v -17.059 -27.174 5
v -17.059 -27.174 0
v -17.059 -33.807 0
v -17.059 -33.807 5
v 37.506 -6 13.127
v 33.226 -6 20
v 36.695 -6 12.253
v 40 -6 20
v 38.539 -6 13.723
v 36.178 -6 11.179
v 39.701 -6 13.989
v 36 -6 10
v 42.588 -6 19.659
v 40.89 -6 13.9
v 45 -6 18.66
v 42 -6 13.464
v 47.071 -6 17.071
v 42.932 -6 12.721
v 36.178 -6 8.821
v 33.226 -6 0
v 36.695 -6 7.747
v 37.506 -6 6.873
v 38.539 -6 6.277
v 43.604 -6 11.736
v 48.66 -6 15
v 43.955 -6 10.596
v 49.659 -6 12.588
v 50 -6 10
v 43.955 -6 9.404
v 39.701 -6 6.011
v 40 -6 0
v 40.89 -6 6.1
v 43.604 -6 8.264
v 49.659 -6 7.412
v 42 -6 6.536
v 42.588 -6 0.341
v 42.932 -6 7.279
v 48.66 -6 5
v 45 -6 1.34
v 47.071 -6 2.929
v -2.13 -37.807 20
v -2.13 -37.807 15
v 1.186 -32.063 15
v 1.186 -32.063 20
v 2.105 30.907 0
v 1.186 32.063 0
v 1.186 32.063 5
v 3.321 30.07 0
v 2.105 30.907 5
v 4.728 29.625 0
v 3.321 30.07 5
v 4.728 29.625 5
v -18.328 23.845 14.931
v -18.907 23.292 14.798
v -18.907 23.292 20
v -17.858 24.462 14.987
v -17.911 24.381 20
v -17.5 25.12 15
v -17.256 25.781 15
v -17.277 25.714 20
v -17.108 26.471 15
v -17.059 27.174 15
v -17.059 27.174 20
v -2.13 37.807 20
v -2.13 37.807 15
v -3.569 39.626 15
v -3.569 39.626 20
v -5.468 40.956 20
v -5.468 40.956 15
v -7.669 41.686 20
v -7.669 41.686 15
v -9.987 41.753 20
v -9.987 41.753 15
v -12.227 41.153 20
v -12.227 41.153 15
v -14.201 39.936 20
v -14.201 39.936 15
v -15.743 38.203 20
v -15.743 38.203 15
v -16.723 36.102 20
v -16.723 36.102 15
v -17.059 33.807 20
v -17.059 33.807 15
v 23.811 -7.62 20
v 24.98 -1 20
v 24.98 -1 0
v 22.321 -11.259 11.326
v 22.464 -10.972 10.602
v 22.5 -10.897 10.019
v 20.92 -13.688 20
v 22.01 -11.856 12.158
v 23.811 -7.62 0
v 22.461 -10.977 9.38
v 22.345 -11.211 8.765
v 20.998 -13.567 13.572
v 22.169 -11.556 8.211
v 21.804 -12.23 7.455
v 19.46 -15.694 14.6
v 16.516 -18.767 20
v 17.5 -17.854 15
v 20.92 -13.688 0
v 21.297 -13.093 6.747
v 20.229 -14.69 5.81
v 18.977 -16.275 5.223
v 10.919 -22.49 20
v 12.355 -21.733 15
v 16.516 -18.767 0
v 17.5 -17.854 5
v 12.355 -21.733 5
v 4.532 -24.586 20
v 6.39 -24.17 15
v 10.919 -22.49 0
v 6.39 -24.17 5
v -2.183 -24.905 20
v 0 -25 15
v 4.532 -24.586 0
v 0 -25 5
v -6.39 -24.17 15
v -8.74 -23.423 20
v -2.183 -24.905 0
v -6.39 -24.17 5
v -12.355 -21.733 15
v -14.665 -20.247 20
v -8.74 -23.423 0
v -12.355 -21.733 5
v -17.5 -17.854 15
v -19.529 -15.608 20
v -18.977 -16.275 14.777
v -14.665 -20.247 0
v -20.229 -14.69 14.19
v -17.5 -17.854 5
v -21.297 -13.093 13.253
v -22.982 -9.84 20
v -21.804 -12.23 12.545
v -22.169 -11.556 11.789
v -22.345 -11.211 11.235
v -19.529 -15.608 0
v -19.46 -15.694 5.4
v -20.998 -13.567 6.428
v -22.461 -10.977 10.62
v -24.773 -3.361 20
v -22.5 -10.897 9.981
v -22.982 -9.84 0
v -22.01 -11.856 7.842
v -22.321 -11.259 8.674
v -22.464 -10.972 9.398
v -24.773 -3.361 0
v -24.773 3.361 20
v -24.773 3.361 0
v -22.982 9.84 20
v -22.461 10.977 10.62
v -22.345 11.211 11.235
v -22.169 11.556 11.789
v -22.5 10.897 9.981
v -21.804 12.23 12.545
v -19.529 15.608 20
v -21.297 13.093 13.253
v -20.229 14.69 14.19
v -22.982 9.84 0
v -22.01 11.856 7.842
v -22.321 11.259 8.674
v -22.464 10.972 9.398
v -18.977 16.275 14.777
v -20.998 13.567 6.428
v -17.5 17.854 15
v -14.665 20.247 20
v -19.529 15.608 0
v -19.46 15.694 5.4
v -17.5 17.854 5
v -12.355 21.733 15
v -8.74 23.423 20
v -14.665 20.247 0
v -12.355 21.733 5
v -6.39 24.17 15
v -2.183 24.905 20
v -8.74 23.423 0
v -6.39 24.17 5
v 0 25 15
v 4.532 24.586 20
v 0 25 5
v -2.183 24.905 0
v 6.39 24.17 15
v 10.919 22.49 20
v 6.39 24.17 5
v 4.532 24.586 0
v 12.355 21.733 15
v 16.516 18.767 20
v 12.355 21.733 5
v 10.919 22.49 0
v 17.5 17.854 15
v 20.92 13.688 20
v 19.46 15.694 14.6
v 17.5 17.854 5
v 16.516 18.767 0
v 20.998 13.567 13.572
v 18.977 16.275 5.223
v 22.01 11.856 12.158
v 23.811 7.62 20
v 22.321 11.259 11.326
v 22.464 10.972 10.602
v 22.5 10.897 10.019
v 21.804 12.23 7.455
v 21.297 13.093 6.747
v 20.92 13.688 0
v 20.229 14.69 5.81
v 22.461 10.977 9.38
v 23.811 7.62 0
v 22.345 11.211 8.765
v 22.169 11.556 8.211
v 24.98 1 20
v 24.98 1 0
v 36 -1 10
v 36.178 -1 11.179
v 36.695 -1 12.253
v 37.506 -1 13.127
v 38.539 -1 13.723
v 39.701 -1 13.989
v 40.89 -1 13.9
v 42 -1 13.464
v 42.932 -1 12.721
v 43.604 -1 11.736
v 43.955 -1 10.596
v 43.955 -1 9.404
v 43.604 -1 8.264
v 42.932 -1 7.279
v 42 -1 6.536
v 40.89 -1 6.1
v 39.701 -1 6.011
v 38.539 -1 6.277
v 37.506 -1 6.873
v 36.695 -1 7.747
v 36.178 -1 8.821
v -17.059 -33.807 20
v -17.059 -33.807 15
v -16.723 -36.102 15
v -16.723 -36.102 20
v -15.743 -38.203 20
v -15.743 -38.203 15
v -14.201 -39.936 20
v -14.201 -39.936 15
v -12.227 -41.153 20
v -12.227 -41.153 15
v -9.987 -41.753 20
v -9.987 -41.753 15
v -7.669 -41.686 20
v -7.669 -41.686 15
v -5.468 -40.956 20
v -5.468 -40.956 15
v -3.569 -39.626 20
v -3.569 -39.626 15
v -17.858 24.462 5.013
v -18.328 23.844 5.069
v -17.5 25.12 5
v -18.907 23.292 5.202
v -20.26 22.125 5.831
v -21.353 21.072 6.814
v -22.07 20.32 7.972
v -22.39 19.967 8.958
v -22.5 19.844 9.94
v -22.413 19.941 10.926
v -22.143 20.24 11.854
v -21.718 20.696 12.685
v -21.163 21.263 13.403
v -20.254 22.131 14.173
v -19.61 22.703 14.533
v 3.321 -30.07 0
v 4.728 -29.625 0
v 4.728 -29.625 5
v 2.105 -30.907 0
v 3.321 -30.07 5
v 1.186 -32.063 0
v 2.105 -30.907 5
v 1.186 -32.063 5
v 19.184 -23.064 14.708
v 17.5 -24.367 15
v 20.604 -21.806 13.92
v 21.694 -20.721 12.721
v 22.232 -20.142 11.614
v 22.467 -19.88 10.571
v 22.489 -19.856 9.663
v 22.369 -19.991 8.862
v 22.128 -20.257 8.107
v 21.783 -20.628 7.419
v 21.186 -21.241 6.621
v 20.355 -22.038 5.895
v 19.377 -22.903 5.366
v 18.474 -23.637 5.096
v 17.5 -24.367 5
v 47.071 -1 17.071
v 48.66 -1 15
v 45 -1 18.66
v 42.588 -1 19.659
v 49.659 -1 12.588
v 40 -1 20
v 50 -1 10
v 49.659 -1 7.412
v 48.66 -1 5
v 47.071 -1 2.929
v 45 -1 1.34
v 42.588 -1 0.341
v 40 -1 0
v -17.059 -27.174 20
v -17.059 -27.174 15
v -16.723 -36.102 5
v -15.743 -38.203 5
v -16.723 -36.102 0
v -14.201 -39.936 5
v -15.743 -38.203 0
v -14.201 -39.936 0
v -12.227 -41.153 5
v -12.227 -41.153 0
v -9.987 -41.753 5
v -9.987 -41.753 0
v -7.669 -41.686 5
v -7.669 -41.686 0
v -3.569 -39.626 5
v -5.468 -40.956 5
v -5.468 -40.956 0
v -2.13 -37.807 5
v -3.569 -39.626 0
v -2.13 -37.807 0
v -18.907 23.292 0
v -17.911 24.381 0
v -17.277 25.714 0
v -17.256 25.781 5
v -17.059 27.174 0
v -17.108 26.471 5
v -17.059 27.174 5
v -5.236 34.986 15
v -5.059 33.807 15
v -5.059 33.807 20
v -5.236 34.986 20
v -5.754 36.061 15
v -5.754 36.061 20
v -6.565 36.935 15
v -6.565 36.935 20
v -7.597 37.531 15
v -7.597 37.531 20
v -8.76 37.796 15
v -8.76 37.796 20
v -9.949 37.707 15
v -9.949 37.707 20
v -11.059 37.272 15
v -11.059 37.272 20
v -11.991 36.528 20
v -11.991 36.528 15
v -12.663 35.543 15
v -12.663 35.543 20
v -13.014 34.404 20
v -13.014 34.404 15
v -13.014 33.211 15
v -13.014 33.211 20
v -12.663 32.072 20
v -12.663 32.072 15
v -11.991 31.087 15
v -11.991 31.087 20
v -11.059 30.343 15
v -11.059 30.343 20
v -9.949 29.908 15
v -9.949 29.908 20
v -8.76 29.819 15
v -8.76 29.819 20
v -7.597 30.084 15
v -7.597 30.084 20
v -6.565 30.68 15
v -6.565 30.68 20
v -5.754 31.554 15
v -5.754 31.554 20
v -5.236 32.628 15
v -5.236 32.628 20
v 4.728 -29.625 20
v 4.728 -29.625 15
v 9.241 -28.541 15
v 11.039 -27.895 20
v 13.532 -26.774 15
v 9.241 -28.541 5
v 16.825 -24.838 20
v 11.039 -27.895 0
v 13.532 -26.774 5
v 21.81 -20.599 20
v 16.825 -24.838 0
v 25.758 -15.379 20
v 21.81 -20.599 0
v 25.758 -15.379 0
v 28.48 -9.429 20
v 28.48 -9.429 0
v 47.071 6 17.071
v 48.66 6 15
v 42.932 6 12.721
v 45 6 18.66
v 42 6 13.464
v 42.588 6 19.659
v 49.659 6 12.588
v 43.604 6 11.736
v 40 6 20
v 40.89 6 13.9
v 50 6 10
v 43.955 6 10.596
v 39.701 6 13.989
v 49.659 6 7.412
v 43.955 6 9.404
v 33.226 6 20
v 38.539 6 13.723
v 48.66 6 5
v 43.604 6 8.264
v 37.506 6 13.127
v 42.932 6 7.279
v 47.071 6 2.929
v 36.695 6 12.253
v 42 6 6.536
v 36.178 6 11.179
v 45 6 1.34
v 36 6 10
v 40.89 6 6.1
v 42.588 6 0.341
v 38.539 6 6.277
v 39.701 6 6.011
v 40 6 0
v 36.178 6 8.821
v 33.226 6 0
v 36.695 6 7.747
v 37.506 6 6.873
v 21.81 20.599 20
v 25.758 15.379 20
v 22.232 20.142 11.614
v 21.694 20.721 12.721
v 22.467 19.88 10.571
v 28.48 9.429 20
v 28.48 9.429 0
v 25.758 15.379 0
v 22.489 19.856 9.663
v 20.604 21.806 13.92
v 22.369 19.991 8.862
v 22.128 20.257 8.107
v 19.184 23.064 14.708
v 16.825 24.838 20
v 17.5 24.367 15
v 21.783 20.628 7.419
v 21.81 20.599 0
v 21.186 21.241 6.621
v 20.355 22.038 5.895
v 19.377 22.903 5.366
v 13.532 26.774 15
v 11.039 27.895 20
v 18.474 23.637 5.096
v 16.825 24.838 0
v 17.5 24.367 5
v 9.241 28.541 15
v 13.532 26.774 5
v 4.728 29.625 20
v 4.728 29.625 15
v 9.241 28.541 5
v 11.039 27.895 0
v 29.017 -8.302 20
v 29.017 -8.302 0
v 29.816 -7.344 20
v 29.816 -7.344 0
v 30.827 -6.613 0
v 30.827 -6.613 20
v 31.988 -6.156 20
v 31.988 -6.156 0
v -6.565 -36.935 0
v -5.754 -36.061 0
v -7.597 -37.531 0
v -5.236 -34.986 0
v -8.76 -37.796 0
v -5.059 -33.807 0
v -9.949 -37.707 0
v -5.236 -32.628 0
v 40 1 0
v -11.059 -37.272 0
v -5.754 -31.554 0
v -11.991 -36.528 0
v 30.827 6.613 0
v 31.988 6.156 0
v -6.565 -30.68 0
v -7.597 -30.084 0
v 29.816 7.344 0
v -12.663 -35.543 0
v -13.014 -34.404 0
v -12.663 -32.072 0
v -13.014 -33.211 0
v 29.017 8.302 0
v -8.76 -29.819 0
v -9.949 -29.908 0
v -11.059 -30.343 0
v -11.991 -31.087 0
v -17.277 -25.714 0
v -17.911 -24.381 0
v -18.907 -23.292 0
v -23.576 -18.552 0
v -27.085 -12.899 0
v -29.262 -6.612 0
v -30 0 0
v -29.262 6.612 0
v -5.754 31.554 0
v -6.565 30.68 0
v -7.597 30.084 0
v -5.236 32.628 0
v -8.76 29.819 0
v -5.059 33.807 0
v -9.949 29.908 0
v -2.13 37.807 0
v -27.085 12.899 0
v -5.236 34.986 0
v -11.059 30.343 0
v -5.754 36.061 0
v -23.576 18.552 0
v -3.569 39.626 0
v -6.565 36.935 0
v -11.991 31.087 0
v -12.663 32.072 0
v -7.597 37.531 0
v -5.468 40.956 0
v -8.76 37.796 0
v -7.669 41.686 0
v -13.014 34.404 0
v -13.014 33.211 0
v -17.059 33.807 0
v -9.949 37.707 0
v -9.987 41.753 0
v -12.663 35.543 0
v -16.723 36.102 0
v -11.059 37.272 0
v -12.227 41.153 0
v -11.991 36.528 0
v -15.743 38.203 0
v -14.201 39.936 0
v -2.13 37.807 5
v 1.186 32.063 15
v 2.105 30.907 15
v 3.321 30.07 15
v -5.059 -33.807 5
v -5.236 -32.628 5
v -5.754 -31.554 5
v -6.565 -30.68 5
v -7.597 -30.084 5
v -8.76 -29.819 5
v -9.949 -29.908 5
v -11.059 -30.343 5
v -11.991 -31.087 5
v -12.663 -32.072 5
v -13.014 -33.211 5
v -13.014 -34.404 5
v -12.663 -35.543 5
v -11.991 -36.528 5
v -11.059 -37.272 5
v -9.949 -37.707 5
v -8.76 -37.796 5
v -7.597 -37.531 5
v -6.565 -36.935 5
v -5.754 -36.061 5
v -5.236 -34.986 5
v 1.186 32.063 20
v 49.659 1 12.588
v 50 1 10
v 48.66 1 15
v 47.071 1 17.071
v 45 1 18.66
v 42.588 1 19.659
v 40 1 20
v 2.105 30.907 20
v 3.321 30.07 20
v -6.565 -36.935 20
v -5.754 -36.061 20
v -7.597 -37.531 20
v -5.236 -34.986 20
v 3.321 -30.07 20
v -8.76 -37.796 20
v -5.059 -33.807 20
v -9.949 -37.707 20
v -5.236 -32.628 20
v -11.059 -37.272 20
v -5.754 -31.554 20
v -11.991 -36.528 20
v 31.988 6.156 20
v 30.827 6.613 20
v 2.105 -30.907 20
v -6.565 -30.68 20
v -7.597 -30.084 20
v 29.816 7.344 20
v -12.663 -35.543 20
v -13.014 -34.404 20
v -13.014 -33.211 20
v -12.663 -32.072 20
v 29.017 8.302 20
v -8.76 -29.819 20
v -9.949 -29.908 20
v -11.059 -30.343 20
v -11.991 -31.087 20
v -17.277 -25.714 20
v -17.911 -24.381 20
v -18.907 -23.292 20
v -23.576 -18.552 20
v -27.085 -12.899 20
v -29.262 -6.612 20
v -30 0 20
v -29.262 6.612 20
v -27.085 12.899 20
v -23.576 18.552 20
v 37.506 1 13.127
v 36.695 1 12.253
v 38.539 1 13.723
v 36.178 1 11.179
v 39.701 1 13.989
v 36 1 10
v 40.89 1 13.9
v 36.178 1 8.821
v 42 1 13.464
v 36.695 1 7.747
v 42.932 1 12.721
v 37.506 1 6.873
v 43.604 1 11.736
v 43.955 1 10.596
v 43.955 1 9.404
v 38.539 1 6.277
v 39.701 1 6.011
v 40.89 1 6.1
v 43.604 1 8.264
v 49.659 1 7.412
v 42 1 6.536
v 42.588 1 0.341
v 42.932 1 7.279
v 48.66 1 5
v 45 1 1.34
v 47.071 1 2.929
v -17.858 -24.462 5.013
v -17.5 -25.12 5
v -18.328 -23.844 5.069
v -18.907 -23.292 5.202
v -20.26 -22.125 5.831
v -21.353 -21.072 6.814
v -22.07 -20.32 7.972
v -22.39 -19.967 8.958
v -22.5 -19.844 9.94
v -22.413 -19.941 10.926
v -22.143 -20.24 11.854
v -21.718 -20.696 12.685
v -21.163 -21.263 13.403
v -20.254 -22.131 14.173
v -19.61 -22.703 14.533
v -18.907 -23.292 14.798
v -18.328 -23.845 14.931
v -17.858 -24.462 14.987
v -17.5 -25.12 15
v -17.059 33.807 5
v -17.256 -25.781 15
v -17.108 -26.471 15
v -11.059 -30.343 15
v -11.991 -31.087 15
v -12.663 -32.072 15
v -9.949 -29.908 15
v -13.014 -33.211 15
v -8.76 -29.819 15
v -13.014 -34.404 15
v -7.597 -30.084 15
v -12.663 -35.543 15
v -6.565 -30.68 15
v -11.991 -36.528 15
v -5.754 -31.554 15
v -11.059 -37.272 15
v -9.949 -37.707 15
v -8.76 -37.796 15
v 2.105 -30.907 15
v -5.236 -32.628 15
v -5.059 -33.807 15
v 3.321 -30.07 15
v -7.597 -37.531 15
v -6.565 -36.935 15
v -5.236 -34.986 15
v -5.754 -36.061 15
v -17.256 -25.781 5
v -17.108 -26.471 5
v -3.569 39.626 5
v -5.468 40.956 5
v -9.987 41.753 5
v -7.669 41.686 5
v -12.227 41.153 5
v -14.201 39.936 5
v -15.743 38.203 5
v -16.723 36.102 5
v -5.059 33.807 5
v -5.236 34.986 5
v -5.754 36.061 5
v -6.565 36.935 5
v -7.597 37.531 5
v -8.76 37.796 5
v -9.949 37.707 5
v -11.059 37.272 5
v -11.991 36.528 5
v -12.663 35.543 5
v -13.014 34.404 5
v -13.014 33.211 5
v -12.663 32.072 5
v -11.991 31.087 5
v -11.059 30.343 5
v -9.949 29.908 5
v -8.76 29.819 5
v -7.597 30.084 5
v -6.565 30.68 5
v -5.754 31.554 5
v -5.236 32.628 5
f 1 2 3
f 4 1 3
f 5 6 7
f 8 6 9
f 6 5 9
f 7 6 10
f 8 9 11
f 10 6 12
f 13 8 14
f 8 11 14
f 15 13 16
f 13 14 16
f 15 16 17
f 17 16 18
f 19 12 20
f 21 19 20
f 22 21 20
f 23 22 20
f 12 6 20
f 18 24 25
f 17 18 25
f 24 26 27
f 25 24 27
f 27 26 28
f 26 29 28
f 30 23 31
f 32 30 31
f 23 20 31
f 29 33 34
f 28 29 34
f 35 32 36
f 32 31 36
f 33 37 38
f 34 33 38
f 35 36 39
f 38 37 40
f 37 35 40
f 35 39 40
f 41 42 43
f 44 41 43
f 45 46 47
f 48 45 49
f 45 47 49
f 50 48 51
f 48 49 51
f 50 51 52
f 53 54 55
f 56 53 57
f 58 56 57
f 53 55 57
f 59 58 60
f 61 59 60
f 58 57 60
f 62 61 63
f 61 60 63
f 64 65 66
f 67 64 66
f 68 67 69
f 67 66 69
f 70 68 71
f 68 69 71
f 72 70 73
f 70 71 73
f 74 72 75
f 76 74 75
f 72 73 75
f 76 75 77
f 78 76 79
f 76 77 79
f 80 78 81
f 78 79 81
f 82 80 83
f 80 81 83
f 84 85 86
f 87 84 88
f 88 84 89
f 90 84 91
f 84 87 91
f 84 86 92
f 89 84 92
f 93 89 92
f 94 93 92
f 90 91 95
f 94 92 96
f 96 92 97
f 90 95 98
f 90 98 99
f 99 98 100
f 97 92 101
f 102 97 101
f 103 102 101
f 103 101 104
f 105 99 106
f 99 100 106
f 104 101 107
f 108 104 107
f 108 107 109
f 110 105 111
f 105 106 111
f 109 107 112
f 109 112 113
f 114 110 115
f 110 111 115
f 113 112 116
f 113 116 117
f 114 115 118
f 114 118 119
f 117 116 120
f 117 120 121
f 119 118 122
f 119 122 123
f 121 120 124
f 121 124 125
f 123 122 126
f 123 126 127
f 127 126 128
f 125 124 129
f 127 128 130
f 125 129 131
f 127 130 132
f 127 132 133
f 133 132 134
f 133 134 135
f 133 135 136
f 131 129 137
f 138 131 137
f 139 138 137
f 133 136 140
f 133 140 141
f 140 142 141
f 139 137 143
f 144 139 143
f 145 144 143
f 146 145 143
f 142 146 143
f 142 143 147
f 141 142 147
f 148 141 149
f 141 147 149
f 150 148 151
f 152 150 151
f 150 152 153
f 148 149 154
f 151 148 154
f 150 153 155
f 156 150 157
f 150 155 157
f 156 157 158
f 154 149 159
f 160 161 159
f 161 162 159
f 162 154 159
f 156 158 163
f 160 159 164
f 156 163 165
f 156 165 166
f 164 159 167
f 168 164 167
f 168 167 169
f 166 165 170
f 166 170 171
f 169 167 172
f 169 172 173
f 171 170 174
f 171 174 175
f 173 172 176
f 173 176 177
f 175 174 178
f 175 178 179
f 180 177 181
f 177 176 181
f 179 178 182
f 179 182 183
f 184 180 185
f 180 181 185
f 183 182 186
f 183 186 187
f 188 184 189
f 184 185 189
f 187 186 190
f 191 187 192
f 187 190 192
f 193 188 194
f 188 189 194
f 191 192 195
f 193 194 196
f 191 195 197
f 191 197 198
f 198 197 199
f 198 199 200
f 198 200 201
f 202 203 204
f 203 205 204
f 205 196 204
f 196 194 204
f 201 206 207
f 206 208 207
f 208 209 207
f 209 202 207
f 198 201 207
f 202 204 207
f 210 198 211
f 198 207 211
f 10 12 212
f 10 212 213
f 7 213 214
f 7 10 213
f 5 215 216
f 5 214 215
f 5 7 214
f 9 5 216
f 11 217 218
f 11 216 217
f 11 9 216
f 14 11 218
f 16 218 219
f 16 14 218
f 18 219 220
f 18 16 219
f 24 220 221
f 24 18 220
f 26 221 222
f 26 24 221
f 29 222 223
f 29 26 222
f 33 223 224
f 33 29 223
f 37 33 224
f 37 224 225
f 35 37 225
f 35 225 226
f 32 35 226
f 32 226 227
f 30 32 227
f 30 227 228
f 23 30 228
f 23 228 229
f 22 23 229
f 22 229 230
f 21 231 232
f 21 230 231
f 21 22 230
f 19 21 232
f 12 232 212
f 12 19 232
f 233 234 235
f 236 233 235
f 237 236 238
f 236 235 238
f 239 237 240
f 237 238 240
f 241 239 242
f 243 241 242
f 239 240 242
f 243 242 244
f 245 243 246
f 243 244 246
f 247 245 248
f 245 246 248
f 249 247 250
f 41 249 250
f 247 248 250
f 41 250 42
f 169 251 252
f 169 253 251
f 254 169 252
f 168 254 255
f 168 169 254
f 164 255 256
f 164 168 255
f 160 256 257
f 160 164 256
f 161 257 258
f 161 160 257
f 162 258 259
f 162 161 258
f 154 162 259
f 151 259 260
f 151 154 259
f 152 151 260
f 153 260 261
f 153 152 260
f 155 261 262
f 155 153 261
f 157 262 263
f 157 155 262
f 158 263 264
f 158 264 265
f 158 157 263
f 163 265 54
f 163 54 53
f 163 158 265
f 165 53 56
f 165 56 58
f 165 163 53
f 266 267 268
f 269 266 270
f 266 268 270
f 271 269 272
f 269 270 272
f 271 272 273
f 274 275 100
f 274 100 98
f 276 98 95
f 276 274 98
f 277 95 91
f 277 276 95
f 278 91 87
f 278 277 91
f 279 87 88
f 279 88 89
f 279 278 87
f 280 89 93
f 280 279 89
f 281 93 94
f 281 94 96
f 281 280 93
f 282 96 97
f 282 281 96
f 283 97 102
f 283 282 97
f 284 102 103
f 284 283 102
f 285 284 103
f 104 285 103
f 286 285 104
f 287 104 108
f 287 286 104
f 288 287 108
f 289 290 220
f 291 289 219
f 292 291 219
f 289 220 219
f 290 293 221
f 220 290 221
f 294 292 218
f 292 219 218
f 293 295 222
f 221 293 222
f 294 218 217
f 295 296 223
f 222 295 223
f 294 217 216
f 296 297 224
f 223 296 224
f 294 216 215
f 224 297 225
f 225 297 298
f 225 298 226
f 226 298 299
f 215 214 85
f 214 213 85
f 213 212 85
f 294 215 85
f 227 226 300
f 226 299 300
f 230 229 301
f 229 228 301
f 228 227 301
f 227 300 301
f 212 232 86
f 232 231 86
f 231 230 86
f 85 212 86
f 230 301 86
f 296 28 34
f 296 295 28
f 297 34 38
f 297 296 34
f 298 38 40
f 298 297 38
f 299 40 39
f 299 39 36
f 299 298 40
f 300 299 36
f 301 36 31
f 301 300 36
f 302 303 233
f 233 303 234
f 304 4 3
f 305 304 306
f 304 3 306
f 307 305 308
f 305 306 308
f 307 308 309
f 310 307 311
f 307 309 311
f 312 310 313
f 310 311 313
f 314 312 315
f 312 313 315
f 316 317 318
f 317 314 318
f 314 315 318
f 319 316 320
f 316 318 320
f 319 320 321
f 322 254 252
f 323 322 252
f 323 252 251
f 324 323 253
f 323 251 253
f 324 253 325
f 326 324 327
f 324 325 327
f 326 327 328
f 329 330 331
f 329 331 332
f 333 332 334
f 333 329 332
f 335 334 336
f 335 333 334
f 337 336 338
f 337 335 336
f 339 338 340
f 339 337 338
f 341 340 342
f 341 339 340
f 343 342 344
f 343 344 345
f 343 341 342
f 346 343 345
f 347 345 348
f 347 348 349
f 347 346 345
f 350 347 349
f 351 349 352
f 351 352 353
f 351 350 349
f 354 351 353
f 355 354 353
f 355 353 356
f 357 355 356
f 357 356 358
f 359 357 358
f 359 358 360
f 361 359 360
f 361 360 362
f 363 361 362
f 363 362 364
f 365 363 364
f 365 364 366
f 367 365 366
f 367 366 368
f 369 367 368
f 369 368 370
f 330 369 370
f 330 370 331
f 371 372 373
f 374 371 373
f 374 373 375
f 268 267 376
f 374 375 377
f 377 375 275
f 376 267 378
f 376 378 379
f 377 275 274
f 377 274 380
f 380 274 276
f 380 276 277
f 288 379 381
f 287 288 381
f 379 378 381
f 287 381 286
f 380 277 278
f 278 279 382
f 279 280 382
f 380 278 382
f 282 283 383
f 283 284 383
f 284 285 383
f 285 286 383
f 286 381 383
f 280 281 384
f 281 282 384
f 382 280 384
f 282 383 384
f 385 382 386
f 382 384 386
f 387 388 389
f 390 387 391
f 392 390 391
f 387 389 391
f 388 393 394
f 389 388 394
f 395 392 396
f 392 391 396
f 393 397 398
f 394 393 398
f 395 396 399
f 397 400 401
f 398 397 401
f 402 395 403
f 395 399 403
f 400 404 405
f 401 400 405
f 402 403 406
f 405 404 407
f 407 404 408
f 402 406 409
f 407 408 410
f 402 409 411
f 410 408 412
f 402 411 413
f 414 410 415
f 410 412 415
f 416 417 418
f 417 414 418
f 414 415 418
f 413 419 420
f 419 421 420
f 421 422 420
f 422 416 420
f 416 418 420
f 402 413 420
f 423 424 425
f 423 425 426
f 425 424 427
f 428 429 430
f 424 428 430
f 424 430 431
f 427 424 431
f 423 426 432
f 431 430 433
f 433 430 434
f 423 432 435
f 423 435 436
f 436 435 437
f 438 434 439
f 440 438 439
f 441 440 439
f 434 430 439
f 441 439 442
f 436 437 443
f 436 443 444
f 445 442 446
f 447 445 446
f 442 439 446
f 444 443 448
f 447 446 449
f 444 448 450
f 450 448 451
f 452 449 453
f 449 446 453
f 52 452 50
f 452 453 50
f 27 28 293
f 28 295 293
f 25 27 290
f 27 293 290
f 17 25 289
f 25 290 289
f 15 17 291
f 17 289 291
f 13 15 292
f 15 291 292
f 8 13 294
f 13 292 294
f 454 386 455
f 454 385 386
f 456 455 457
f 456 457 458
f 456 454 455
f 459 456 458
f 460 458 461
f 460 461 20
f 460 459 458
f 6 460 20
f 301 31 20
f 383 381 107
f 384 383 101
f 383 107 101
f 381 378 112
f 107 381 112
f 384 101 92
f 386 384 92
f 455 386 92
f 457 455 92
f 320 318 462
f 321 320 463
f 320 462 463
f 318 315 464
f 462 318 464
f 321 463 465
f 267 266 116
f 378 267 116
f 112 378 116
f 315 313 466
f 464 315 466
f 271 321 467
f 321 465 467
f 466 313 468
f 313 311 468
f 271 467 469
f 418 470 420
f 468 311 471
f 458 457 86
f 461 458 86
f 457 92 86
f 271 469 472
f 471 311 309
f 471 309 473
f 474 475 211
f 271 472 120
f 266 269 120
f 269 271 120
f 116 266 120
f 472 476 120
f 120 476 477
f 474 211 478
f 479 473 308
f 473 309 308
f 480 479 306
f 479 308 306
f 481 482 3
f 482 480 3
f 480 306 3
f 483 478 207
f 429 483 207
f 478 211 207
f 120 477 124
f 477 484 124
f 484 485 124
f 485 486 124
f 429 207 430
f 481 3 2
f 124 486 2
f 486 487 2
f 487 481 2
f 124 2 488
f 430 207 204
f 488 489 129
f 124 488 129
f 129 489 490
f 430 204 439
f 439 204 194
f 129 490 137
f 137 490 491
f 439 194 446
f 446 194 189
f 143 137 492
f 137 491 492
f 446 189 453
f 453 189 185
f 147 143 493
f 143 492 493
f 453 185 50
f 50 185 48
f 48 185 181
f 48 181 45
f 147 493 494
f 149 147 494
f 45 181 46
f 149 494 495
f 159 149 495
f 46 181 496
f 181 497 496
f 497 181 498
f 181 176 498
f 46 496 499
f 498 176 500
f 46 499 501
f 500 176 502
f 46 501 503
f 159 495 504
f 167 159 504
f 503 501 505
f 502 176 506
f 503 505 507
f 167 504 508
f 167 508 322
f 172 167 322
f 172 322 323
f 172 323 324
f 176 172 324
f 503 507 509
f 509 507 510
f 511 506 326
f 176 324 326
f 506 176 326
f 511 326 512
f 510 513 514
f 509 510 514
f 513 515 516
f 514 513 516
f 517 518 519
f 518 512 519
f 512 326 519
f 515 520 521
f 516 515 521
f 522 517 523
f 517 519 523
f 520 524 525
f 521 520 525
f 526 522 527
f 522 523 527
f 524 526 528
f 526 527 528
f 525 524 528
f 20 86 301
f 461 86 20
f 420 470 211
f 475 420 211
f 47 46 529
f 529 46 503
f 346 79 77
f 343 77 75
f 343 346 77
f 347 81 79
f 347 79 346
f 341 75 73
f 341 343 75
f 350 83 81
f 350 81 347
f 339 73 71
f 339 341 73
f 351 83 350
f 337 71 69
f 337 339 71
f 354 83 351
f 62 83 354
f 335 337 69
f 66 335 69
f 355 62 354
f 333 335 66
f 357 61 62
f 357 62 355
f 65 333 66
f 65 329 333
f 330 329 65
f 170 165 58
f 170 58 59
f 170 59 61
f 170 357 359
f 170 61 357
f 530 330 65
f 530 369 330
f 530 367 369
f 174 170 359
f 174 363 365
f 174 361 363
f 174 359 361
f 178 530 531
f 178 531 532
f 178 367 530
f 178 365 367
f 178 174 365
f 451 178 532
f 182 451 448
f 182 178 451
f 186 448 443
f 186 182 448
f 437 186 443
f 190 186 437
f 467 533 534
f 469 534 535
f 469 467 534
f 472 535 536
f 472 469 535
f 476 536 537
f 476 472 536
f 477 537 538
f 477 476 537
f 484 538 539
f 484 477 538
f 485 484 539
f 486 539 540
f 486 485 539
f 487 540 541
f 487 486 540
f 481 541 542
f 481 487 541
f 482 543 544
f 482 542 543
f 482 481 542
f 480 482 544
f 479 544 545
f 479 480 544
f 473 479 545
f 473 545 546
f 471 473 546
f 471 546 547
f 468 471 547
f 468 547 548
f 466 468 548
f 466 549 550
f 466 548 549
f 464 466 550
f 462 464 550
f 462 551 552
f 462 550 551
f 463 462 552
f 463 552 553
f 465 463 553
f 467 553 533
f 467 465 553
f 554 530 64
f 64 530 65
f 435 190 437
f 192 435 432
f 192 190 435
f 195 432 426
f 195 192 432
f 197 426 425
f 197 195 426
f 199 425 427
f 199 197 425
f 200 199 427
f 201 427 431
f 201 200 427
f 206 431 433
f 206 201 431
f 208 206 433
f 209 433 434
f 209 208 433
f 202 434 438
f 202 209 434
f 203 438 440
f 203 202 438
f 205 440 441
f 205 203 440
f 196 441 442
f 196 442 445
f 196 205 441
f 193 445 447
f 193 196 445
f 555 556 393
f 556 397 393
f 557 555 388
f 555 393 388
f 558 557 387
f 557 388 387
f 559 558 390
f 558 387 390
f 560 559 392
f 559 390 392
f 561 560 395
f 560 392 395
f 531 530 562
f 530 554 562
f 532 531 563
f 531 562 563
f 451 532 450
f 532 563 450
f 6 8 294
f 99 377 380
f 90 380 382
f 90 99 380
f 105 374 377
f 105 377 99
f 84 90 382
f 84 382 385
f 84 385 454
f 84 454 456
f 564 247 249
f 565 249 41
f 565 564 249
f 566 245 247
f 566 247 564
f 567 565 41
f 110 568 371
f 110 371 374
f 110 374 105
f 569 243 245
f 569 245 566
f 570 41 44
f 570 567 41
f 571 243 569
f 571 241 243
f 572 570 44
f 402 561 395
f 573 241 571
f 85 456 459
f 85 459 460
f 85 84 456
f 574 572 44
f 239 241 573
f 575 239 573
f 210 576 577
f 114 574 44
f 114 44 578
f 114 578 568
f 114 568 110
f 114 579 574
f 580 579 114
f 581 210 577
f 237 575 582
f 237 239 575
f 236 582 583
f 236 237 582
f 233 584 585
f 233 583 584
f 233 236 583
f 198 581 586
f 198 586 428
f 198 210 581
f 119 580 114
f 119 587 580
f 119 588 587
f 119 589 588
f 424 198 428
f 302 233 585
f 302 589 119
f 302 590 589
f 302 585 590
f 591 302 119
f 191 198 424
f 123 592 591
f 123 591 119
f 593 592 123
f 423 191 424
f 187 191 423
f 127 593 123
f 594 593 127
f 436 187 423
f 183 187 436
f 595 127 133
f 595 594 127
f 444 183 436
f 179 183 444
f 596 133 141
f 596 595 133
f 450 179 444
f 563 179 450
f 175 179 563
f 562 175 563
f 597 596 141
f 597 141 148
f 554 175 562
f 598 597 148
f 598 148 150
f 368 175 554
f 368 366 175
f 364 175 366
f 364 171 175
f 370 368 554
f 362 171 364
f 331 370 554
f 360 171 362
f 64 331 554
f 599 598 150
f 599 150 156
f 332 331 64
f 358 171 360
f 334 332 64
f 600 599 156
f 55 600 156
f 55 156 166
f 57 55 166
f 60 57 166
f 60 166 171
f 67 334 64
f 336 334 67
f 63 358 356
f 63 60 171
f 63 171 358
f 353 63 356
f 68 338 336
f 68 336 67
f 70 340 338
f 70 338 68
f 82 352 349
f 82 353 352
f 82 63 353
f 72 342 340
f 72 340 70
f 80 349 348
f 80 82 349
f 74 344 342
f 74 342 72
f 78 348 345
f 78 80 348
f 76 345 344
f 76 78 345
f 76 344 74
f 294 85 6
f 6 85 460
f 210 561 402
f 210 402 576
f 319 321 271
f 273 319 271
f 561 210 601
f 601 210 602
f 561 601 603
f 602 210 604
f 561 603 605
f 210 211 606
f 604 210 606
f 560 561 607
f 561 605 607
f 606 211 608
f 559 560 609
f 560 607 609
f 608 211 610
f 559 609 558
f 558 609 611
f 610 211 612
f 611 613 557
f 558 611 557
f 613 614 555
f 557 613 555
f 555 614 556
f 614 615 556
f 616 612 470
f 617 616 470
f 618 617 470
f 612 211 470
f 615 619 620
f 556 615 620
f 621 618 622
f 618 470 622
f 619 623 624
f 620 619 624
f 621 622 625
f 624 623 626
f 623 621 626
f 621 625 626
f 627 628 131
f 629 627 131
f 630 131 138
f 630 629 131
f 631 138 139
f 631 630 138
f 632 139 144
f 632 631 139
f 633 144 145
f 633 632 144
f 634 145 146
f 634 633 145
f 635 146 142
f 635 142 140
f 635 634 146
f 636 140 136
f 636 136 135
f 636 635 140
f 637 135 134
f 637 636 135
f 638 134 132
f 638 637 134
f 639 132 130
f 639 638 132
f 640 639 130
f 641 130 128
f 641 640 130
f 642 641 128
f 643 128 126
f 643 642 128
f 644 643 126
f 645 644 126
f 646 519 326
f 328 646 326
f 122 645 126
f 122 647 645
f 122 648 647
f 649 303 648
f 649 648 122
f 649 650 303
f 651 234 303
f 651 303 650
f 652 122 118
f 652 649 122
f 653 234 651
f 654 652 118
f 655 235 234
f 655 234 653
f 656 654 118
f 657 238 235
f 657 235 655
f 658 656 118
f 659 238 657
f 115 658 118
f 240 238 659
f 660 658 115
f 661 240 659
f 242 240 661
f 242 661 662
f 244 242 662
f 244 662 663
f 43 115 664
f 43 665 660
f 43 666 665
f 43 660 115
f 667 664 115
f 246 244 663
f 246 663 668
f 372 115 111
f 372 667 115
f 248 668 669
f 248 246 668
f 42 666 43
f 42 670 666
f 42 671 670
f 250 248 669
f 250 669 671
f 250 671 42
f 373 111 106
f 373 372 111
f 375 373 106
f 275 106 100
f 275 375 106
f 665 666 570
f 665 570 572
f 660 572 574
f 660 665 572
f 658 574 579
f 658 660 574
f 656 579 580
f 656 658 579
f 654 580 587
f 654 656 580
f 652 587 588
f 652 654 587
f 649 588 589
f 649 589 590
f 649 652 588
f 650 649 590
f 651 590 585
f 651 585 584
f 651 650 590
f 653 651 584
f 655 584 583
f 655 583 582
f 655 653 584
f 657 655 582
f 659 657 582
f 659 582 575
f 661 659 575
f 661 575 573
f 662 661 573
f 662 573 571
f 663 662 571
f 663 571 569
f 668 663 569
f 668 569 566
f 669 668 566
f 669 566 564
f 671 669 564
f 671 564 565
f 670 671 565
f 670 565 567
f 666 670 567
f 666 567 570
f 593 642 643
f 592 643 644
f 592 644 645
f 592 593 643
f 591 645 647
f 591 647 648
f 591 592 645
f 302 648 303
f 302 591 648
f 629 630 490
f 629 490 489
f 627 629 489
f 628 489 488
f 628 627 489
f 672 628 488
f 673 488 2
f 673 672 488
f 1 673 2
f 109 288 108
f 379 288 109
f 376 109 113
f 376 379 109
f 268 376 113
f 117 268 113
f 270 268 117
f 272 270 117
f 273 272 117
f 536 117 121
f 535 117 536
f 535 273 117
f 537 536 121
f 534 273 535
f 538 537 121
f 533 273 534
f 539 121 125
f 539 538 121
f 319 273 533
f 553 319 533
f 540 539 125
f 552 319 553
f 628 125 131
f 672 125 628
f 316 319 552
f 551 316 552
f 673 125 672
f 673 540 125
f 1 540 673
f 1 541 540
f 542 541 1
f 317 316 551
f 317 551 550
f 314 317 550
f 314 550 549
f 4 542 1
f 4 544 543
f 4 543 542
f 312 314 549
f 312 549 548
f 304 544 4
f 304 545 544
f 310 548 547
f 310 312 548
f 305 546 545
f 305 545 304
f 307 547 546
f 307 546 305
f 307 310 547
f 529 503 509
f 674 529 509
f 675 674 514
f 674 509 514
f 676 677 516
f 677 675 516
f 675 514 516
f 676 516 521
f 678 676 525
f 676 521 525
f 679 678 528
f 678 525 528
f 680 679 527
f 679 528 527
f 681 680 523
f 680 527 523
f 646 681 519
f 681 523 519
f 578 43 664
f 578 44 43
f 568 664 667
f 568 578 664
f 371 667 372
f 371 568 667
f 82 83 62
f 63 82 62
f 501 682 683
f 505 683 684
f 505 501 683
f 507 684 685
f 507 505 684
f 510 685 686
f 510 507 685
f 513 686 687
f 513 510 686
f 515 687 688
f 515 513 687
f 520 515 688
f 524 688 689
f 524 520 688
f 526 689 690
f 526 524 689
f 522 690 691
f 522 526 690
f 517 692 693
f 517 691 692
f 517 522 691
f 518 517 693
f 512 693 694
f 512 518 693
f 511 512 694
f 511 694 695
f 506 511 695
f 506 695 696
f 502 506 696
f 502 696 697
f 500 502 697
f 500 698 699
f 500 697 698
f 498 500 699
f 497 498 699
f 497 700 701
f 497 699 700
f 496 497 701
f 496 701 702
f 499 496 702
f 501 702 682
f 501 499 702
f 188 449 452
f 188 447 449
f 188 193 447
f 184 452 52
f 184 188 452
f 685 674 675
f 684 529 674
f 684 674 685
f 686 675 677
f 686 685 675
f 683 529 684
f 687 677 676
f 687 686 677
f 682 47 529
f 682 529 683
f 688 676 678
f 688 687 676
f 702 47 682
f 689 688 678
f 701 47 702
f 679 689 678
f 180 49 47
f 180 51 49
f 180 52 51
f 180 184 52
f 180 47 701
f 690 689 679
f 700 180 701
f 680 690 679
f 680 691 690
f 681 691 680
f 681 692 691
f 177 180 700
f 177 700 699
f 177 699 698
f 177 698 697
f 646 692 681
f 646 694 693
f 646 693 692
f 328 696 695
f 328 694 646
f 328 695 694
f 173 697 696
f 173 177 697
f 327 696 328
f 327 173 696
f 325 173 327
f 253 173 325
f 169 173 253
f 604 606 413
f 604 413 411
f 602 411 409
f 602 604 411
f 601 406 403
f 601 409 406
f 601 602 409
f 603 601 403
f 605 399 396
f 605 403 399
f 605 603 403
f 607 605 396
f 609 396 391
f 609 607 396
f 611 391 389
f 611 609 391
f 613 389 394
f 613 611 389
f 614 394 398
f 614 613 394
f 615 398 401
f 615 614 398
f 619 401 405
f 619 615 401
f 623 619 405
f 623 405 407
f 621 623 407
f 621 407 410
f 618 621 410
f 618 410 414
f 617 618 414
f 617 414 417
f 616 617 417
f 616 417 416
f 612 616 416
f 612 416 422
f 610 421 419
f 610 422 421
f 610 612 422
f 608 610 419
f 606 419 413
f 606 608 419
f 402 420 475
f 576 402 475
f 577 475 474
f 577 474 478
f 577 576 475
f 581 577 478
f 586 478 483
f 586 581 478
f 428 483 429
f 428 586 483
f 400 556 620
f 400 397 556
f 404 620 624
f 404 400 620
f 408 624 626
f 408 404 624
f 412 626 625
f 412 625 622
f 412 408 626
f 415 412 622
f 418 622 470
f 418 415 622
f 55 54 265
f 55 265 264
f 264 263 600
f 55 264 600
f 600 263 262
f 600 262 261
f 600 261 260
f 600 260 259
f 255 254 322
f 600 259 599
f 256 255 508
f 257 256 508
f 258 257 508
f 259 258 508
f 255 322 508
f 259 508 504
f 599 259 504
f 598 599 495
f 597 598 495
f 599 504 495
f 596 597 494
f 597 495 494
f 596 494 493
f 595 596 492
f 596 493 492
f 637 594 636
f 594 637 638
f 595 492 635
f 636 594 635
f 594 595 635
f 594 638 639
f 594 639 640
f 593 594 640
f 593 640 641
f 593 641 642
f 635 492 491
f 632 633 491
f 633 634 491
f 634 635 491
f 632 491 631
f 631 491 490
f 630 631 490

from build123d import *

# Parameters (mm, degrees)
SKETCH1_R              = 4
BOSS_EXTRUDE1_DEPTH    = 20
FILLET1_R              = 10
CUT_EXTRUDE1_START     = -41.80740392
CUT_EXTRUDE1_OUTLINE_R = 4
CUT_EXTRUDE1_DEPTH     = 83.61480784
FILLET2_R              = 5


# Read off the part's stored shape, not the designer's step: Cut-Extrude1
with BuildPart() as part:
    # Sketch1 → Boss-Extrude1 (new body)
    with BuildSketch(Plane(origin=(0, 0, 0), x_dir=(0, 1, 0), z_dir=(0, 0, 1))):
        with BuildLine():
            ThreePointArc((24.677963744, 17.058666579), (0, 30), (-24.677963744, 17.058666579))
            Line((-24.677963744, 17.058666579), (-33.80740392, 17.058666579))
            ThreePointArc((-33.80740392, 17.058666579), (-41.534810495, 11.129219073), (-37.80740416, 2.130463487))
            Line((-37.80740416, 2.130463487), (-29.901076805, -2.43425674))
            ThreePointArc((-29.901076805, -2.43425674), (-22.448320849, -19.901580115), (-6, -29.393876913))
            Line((-6, -29.393876913), (-6, -50))
            Line((-6, -50), (-1, -50))
            Line((-1, -50), (-1, -24.979991994))
            ThreePointArc((-1, -24.979991994), (0, 25), (1, -24.979991994))
            Line((1, -24.979991994), (1, -50))
            Line((1, -50), (6, -50))
            Line((6, -50), (6, -29.393876913))
            ThreePointArc((6, -29.393876913), (22.448320849, -19.901580115), (29.901076805, -2.43425674))
            Line((29.901076805, -2.43425674), (37.807403702, 2.130463222))
            ThreePointArc((37.807403702, 2.130463222), (41.534810563, 11.129218818), (33.80740392, 17.058666579))
            Line((33.80740392, 17.058666579), (24.677963744, 17.058666579))
        make_face()
        with Locations(Location((-33.80740392, 9.058666579, 0), (0, 0, 270))):
            Circle(SKETCH1_R, mode=Mode.SUBTRACT)
        with Locations(Location((33.80740392, 9.058666579, 0), (0, 0, 270))):
            Circle(SKETCH1_R, mode=Mode.SUBTRACT)
    extrude(amount=BOSS_EXTRUDE1_DEPTH)

    # Fillet1
    fillet1_edges = [part.edges().sort_by_distance(p)[0] for p in [
        (50, 3.5, 0),
        (50, 3.5, 20),
        (50, -3.5, 0),
        (50, -3.5, 20),
    ]]
    fillet(fillet1_edges, radius=FILLET1_R - 0.0001)  # a hair under: the kernel refuses the full size

    # Cut-Extrude1 outline → Cut-Extrude1 (cut)
    with BuildSketch(Plane(origin=(0, 0, 0), x_dir=(-1, 0, 0), z_dir=(0, 1, 0)).offset(CUT_EXTRUDE1_START)):
        with BuildLine():
            ThreePointArc((17.5, 5), (22.5, 10), (17.5, 15))
            Line((17.5, 15), (-17.5, 15))
            ThreePointArc((-17.5, 15), (-22.5, 10), (-17.5, 5))
            Line((-17.5, 5), (17.5, 5))
        make_face()
        with Locations((-40, 10)):
            Circle(CUT_EXTRUDE1_OUTLINE_R)
    extrude(amount=CUT_EXTRUDE1_DEPTH, mode=Mode.SUBTRACT)

    # Fillet2
    fillet2_edges = [part.edges().sort_by_distance(p)[0] for p in [
        (29.393876913, -6, 10),
        (2.43425674, -29.901076805, 17.5),
        (2.43425674, -29.901076805, 2.5),
        (-17.058666579, -24.677963744, 17.5),
        (-17.058666579, -24.677963744, 2.5),
        (-17.058666579, 24.677963744, 17.5),
        (-17.058666579, 24.677963744, 2.5),
        (2.43425674, 29.901076805, 2.5),
        (2.43425674, 29.901076805, 17.5),
        (29.393876913, 6, 10),
    ]]
    fillet(fillet2_edges, radius=FILLET2_R)


solid = part.part
